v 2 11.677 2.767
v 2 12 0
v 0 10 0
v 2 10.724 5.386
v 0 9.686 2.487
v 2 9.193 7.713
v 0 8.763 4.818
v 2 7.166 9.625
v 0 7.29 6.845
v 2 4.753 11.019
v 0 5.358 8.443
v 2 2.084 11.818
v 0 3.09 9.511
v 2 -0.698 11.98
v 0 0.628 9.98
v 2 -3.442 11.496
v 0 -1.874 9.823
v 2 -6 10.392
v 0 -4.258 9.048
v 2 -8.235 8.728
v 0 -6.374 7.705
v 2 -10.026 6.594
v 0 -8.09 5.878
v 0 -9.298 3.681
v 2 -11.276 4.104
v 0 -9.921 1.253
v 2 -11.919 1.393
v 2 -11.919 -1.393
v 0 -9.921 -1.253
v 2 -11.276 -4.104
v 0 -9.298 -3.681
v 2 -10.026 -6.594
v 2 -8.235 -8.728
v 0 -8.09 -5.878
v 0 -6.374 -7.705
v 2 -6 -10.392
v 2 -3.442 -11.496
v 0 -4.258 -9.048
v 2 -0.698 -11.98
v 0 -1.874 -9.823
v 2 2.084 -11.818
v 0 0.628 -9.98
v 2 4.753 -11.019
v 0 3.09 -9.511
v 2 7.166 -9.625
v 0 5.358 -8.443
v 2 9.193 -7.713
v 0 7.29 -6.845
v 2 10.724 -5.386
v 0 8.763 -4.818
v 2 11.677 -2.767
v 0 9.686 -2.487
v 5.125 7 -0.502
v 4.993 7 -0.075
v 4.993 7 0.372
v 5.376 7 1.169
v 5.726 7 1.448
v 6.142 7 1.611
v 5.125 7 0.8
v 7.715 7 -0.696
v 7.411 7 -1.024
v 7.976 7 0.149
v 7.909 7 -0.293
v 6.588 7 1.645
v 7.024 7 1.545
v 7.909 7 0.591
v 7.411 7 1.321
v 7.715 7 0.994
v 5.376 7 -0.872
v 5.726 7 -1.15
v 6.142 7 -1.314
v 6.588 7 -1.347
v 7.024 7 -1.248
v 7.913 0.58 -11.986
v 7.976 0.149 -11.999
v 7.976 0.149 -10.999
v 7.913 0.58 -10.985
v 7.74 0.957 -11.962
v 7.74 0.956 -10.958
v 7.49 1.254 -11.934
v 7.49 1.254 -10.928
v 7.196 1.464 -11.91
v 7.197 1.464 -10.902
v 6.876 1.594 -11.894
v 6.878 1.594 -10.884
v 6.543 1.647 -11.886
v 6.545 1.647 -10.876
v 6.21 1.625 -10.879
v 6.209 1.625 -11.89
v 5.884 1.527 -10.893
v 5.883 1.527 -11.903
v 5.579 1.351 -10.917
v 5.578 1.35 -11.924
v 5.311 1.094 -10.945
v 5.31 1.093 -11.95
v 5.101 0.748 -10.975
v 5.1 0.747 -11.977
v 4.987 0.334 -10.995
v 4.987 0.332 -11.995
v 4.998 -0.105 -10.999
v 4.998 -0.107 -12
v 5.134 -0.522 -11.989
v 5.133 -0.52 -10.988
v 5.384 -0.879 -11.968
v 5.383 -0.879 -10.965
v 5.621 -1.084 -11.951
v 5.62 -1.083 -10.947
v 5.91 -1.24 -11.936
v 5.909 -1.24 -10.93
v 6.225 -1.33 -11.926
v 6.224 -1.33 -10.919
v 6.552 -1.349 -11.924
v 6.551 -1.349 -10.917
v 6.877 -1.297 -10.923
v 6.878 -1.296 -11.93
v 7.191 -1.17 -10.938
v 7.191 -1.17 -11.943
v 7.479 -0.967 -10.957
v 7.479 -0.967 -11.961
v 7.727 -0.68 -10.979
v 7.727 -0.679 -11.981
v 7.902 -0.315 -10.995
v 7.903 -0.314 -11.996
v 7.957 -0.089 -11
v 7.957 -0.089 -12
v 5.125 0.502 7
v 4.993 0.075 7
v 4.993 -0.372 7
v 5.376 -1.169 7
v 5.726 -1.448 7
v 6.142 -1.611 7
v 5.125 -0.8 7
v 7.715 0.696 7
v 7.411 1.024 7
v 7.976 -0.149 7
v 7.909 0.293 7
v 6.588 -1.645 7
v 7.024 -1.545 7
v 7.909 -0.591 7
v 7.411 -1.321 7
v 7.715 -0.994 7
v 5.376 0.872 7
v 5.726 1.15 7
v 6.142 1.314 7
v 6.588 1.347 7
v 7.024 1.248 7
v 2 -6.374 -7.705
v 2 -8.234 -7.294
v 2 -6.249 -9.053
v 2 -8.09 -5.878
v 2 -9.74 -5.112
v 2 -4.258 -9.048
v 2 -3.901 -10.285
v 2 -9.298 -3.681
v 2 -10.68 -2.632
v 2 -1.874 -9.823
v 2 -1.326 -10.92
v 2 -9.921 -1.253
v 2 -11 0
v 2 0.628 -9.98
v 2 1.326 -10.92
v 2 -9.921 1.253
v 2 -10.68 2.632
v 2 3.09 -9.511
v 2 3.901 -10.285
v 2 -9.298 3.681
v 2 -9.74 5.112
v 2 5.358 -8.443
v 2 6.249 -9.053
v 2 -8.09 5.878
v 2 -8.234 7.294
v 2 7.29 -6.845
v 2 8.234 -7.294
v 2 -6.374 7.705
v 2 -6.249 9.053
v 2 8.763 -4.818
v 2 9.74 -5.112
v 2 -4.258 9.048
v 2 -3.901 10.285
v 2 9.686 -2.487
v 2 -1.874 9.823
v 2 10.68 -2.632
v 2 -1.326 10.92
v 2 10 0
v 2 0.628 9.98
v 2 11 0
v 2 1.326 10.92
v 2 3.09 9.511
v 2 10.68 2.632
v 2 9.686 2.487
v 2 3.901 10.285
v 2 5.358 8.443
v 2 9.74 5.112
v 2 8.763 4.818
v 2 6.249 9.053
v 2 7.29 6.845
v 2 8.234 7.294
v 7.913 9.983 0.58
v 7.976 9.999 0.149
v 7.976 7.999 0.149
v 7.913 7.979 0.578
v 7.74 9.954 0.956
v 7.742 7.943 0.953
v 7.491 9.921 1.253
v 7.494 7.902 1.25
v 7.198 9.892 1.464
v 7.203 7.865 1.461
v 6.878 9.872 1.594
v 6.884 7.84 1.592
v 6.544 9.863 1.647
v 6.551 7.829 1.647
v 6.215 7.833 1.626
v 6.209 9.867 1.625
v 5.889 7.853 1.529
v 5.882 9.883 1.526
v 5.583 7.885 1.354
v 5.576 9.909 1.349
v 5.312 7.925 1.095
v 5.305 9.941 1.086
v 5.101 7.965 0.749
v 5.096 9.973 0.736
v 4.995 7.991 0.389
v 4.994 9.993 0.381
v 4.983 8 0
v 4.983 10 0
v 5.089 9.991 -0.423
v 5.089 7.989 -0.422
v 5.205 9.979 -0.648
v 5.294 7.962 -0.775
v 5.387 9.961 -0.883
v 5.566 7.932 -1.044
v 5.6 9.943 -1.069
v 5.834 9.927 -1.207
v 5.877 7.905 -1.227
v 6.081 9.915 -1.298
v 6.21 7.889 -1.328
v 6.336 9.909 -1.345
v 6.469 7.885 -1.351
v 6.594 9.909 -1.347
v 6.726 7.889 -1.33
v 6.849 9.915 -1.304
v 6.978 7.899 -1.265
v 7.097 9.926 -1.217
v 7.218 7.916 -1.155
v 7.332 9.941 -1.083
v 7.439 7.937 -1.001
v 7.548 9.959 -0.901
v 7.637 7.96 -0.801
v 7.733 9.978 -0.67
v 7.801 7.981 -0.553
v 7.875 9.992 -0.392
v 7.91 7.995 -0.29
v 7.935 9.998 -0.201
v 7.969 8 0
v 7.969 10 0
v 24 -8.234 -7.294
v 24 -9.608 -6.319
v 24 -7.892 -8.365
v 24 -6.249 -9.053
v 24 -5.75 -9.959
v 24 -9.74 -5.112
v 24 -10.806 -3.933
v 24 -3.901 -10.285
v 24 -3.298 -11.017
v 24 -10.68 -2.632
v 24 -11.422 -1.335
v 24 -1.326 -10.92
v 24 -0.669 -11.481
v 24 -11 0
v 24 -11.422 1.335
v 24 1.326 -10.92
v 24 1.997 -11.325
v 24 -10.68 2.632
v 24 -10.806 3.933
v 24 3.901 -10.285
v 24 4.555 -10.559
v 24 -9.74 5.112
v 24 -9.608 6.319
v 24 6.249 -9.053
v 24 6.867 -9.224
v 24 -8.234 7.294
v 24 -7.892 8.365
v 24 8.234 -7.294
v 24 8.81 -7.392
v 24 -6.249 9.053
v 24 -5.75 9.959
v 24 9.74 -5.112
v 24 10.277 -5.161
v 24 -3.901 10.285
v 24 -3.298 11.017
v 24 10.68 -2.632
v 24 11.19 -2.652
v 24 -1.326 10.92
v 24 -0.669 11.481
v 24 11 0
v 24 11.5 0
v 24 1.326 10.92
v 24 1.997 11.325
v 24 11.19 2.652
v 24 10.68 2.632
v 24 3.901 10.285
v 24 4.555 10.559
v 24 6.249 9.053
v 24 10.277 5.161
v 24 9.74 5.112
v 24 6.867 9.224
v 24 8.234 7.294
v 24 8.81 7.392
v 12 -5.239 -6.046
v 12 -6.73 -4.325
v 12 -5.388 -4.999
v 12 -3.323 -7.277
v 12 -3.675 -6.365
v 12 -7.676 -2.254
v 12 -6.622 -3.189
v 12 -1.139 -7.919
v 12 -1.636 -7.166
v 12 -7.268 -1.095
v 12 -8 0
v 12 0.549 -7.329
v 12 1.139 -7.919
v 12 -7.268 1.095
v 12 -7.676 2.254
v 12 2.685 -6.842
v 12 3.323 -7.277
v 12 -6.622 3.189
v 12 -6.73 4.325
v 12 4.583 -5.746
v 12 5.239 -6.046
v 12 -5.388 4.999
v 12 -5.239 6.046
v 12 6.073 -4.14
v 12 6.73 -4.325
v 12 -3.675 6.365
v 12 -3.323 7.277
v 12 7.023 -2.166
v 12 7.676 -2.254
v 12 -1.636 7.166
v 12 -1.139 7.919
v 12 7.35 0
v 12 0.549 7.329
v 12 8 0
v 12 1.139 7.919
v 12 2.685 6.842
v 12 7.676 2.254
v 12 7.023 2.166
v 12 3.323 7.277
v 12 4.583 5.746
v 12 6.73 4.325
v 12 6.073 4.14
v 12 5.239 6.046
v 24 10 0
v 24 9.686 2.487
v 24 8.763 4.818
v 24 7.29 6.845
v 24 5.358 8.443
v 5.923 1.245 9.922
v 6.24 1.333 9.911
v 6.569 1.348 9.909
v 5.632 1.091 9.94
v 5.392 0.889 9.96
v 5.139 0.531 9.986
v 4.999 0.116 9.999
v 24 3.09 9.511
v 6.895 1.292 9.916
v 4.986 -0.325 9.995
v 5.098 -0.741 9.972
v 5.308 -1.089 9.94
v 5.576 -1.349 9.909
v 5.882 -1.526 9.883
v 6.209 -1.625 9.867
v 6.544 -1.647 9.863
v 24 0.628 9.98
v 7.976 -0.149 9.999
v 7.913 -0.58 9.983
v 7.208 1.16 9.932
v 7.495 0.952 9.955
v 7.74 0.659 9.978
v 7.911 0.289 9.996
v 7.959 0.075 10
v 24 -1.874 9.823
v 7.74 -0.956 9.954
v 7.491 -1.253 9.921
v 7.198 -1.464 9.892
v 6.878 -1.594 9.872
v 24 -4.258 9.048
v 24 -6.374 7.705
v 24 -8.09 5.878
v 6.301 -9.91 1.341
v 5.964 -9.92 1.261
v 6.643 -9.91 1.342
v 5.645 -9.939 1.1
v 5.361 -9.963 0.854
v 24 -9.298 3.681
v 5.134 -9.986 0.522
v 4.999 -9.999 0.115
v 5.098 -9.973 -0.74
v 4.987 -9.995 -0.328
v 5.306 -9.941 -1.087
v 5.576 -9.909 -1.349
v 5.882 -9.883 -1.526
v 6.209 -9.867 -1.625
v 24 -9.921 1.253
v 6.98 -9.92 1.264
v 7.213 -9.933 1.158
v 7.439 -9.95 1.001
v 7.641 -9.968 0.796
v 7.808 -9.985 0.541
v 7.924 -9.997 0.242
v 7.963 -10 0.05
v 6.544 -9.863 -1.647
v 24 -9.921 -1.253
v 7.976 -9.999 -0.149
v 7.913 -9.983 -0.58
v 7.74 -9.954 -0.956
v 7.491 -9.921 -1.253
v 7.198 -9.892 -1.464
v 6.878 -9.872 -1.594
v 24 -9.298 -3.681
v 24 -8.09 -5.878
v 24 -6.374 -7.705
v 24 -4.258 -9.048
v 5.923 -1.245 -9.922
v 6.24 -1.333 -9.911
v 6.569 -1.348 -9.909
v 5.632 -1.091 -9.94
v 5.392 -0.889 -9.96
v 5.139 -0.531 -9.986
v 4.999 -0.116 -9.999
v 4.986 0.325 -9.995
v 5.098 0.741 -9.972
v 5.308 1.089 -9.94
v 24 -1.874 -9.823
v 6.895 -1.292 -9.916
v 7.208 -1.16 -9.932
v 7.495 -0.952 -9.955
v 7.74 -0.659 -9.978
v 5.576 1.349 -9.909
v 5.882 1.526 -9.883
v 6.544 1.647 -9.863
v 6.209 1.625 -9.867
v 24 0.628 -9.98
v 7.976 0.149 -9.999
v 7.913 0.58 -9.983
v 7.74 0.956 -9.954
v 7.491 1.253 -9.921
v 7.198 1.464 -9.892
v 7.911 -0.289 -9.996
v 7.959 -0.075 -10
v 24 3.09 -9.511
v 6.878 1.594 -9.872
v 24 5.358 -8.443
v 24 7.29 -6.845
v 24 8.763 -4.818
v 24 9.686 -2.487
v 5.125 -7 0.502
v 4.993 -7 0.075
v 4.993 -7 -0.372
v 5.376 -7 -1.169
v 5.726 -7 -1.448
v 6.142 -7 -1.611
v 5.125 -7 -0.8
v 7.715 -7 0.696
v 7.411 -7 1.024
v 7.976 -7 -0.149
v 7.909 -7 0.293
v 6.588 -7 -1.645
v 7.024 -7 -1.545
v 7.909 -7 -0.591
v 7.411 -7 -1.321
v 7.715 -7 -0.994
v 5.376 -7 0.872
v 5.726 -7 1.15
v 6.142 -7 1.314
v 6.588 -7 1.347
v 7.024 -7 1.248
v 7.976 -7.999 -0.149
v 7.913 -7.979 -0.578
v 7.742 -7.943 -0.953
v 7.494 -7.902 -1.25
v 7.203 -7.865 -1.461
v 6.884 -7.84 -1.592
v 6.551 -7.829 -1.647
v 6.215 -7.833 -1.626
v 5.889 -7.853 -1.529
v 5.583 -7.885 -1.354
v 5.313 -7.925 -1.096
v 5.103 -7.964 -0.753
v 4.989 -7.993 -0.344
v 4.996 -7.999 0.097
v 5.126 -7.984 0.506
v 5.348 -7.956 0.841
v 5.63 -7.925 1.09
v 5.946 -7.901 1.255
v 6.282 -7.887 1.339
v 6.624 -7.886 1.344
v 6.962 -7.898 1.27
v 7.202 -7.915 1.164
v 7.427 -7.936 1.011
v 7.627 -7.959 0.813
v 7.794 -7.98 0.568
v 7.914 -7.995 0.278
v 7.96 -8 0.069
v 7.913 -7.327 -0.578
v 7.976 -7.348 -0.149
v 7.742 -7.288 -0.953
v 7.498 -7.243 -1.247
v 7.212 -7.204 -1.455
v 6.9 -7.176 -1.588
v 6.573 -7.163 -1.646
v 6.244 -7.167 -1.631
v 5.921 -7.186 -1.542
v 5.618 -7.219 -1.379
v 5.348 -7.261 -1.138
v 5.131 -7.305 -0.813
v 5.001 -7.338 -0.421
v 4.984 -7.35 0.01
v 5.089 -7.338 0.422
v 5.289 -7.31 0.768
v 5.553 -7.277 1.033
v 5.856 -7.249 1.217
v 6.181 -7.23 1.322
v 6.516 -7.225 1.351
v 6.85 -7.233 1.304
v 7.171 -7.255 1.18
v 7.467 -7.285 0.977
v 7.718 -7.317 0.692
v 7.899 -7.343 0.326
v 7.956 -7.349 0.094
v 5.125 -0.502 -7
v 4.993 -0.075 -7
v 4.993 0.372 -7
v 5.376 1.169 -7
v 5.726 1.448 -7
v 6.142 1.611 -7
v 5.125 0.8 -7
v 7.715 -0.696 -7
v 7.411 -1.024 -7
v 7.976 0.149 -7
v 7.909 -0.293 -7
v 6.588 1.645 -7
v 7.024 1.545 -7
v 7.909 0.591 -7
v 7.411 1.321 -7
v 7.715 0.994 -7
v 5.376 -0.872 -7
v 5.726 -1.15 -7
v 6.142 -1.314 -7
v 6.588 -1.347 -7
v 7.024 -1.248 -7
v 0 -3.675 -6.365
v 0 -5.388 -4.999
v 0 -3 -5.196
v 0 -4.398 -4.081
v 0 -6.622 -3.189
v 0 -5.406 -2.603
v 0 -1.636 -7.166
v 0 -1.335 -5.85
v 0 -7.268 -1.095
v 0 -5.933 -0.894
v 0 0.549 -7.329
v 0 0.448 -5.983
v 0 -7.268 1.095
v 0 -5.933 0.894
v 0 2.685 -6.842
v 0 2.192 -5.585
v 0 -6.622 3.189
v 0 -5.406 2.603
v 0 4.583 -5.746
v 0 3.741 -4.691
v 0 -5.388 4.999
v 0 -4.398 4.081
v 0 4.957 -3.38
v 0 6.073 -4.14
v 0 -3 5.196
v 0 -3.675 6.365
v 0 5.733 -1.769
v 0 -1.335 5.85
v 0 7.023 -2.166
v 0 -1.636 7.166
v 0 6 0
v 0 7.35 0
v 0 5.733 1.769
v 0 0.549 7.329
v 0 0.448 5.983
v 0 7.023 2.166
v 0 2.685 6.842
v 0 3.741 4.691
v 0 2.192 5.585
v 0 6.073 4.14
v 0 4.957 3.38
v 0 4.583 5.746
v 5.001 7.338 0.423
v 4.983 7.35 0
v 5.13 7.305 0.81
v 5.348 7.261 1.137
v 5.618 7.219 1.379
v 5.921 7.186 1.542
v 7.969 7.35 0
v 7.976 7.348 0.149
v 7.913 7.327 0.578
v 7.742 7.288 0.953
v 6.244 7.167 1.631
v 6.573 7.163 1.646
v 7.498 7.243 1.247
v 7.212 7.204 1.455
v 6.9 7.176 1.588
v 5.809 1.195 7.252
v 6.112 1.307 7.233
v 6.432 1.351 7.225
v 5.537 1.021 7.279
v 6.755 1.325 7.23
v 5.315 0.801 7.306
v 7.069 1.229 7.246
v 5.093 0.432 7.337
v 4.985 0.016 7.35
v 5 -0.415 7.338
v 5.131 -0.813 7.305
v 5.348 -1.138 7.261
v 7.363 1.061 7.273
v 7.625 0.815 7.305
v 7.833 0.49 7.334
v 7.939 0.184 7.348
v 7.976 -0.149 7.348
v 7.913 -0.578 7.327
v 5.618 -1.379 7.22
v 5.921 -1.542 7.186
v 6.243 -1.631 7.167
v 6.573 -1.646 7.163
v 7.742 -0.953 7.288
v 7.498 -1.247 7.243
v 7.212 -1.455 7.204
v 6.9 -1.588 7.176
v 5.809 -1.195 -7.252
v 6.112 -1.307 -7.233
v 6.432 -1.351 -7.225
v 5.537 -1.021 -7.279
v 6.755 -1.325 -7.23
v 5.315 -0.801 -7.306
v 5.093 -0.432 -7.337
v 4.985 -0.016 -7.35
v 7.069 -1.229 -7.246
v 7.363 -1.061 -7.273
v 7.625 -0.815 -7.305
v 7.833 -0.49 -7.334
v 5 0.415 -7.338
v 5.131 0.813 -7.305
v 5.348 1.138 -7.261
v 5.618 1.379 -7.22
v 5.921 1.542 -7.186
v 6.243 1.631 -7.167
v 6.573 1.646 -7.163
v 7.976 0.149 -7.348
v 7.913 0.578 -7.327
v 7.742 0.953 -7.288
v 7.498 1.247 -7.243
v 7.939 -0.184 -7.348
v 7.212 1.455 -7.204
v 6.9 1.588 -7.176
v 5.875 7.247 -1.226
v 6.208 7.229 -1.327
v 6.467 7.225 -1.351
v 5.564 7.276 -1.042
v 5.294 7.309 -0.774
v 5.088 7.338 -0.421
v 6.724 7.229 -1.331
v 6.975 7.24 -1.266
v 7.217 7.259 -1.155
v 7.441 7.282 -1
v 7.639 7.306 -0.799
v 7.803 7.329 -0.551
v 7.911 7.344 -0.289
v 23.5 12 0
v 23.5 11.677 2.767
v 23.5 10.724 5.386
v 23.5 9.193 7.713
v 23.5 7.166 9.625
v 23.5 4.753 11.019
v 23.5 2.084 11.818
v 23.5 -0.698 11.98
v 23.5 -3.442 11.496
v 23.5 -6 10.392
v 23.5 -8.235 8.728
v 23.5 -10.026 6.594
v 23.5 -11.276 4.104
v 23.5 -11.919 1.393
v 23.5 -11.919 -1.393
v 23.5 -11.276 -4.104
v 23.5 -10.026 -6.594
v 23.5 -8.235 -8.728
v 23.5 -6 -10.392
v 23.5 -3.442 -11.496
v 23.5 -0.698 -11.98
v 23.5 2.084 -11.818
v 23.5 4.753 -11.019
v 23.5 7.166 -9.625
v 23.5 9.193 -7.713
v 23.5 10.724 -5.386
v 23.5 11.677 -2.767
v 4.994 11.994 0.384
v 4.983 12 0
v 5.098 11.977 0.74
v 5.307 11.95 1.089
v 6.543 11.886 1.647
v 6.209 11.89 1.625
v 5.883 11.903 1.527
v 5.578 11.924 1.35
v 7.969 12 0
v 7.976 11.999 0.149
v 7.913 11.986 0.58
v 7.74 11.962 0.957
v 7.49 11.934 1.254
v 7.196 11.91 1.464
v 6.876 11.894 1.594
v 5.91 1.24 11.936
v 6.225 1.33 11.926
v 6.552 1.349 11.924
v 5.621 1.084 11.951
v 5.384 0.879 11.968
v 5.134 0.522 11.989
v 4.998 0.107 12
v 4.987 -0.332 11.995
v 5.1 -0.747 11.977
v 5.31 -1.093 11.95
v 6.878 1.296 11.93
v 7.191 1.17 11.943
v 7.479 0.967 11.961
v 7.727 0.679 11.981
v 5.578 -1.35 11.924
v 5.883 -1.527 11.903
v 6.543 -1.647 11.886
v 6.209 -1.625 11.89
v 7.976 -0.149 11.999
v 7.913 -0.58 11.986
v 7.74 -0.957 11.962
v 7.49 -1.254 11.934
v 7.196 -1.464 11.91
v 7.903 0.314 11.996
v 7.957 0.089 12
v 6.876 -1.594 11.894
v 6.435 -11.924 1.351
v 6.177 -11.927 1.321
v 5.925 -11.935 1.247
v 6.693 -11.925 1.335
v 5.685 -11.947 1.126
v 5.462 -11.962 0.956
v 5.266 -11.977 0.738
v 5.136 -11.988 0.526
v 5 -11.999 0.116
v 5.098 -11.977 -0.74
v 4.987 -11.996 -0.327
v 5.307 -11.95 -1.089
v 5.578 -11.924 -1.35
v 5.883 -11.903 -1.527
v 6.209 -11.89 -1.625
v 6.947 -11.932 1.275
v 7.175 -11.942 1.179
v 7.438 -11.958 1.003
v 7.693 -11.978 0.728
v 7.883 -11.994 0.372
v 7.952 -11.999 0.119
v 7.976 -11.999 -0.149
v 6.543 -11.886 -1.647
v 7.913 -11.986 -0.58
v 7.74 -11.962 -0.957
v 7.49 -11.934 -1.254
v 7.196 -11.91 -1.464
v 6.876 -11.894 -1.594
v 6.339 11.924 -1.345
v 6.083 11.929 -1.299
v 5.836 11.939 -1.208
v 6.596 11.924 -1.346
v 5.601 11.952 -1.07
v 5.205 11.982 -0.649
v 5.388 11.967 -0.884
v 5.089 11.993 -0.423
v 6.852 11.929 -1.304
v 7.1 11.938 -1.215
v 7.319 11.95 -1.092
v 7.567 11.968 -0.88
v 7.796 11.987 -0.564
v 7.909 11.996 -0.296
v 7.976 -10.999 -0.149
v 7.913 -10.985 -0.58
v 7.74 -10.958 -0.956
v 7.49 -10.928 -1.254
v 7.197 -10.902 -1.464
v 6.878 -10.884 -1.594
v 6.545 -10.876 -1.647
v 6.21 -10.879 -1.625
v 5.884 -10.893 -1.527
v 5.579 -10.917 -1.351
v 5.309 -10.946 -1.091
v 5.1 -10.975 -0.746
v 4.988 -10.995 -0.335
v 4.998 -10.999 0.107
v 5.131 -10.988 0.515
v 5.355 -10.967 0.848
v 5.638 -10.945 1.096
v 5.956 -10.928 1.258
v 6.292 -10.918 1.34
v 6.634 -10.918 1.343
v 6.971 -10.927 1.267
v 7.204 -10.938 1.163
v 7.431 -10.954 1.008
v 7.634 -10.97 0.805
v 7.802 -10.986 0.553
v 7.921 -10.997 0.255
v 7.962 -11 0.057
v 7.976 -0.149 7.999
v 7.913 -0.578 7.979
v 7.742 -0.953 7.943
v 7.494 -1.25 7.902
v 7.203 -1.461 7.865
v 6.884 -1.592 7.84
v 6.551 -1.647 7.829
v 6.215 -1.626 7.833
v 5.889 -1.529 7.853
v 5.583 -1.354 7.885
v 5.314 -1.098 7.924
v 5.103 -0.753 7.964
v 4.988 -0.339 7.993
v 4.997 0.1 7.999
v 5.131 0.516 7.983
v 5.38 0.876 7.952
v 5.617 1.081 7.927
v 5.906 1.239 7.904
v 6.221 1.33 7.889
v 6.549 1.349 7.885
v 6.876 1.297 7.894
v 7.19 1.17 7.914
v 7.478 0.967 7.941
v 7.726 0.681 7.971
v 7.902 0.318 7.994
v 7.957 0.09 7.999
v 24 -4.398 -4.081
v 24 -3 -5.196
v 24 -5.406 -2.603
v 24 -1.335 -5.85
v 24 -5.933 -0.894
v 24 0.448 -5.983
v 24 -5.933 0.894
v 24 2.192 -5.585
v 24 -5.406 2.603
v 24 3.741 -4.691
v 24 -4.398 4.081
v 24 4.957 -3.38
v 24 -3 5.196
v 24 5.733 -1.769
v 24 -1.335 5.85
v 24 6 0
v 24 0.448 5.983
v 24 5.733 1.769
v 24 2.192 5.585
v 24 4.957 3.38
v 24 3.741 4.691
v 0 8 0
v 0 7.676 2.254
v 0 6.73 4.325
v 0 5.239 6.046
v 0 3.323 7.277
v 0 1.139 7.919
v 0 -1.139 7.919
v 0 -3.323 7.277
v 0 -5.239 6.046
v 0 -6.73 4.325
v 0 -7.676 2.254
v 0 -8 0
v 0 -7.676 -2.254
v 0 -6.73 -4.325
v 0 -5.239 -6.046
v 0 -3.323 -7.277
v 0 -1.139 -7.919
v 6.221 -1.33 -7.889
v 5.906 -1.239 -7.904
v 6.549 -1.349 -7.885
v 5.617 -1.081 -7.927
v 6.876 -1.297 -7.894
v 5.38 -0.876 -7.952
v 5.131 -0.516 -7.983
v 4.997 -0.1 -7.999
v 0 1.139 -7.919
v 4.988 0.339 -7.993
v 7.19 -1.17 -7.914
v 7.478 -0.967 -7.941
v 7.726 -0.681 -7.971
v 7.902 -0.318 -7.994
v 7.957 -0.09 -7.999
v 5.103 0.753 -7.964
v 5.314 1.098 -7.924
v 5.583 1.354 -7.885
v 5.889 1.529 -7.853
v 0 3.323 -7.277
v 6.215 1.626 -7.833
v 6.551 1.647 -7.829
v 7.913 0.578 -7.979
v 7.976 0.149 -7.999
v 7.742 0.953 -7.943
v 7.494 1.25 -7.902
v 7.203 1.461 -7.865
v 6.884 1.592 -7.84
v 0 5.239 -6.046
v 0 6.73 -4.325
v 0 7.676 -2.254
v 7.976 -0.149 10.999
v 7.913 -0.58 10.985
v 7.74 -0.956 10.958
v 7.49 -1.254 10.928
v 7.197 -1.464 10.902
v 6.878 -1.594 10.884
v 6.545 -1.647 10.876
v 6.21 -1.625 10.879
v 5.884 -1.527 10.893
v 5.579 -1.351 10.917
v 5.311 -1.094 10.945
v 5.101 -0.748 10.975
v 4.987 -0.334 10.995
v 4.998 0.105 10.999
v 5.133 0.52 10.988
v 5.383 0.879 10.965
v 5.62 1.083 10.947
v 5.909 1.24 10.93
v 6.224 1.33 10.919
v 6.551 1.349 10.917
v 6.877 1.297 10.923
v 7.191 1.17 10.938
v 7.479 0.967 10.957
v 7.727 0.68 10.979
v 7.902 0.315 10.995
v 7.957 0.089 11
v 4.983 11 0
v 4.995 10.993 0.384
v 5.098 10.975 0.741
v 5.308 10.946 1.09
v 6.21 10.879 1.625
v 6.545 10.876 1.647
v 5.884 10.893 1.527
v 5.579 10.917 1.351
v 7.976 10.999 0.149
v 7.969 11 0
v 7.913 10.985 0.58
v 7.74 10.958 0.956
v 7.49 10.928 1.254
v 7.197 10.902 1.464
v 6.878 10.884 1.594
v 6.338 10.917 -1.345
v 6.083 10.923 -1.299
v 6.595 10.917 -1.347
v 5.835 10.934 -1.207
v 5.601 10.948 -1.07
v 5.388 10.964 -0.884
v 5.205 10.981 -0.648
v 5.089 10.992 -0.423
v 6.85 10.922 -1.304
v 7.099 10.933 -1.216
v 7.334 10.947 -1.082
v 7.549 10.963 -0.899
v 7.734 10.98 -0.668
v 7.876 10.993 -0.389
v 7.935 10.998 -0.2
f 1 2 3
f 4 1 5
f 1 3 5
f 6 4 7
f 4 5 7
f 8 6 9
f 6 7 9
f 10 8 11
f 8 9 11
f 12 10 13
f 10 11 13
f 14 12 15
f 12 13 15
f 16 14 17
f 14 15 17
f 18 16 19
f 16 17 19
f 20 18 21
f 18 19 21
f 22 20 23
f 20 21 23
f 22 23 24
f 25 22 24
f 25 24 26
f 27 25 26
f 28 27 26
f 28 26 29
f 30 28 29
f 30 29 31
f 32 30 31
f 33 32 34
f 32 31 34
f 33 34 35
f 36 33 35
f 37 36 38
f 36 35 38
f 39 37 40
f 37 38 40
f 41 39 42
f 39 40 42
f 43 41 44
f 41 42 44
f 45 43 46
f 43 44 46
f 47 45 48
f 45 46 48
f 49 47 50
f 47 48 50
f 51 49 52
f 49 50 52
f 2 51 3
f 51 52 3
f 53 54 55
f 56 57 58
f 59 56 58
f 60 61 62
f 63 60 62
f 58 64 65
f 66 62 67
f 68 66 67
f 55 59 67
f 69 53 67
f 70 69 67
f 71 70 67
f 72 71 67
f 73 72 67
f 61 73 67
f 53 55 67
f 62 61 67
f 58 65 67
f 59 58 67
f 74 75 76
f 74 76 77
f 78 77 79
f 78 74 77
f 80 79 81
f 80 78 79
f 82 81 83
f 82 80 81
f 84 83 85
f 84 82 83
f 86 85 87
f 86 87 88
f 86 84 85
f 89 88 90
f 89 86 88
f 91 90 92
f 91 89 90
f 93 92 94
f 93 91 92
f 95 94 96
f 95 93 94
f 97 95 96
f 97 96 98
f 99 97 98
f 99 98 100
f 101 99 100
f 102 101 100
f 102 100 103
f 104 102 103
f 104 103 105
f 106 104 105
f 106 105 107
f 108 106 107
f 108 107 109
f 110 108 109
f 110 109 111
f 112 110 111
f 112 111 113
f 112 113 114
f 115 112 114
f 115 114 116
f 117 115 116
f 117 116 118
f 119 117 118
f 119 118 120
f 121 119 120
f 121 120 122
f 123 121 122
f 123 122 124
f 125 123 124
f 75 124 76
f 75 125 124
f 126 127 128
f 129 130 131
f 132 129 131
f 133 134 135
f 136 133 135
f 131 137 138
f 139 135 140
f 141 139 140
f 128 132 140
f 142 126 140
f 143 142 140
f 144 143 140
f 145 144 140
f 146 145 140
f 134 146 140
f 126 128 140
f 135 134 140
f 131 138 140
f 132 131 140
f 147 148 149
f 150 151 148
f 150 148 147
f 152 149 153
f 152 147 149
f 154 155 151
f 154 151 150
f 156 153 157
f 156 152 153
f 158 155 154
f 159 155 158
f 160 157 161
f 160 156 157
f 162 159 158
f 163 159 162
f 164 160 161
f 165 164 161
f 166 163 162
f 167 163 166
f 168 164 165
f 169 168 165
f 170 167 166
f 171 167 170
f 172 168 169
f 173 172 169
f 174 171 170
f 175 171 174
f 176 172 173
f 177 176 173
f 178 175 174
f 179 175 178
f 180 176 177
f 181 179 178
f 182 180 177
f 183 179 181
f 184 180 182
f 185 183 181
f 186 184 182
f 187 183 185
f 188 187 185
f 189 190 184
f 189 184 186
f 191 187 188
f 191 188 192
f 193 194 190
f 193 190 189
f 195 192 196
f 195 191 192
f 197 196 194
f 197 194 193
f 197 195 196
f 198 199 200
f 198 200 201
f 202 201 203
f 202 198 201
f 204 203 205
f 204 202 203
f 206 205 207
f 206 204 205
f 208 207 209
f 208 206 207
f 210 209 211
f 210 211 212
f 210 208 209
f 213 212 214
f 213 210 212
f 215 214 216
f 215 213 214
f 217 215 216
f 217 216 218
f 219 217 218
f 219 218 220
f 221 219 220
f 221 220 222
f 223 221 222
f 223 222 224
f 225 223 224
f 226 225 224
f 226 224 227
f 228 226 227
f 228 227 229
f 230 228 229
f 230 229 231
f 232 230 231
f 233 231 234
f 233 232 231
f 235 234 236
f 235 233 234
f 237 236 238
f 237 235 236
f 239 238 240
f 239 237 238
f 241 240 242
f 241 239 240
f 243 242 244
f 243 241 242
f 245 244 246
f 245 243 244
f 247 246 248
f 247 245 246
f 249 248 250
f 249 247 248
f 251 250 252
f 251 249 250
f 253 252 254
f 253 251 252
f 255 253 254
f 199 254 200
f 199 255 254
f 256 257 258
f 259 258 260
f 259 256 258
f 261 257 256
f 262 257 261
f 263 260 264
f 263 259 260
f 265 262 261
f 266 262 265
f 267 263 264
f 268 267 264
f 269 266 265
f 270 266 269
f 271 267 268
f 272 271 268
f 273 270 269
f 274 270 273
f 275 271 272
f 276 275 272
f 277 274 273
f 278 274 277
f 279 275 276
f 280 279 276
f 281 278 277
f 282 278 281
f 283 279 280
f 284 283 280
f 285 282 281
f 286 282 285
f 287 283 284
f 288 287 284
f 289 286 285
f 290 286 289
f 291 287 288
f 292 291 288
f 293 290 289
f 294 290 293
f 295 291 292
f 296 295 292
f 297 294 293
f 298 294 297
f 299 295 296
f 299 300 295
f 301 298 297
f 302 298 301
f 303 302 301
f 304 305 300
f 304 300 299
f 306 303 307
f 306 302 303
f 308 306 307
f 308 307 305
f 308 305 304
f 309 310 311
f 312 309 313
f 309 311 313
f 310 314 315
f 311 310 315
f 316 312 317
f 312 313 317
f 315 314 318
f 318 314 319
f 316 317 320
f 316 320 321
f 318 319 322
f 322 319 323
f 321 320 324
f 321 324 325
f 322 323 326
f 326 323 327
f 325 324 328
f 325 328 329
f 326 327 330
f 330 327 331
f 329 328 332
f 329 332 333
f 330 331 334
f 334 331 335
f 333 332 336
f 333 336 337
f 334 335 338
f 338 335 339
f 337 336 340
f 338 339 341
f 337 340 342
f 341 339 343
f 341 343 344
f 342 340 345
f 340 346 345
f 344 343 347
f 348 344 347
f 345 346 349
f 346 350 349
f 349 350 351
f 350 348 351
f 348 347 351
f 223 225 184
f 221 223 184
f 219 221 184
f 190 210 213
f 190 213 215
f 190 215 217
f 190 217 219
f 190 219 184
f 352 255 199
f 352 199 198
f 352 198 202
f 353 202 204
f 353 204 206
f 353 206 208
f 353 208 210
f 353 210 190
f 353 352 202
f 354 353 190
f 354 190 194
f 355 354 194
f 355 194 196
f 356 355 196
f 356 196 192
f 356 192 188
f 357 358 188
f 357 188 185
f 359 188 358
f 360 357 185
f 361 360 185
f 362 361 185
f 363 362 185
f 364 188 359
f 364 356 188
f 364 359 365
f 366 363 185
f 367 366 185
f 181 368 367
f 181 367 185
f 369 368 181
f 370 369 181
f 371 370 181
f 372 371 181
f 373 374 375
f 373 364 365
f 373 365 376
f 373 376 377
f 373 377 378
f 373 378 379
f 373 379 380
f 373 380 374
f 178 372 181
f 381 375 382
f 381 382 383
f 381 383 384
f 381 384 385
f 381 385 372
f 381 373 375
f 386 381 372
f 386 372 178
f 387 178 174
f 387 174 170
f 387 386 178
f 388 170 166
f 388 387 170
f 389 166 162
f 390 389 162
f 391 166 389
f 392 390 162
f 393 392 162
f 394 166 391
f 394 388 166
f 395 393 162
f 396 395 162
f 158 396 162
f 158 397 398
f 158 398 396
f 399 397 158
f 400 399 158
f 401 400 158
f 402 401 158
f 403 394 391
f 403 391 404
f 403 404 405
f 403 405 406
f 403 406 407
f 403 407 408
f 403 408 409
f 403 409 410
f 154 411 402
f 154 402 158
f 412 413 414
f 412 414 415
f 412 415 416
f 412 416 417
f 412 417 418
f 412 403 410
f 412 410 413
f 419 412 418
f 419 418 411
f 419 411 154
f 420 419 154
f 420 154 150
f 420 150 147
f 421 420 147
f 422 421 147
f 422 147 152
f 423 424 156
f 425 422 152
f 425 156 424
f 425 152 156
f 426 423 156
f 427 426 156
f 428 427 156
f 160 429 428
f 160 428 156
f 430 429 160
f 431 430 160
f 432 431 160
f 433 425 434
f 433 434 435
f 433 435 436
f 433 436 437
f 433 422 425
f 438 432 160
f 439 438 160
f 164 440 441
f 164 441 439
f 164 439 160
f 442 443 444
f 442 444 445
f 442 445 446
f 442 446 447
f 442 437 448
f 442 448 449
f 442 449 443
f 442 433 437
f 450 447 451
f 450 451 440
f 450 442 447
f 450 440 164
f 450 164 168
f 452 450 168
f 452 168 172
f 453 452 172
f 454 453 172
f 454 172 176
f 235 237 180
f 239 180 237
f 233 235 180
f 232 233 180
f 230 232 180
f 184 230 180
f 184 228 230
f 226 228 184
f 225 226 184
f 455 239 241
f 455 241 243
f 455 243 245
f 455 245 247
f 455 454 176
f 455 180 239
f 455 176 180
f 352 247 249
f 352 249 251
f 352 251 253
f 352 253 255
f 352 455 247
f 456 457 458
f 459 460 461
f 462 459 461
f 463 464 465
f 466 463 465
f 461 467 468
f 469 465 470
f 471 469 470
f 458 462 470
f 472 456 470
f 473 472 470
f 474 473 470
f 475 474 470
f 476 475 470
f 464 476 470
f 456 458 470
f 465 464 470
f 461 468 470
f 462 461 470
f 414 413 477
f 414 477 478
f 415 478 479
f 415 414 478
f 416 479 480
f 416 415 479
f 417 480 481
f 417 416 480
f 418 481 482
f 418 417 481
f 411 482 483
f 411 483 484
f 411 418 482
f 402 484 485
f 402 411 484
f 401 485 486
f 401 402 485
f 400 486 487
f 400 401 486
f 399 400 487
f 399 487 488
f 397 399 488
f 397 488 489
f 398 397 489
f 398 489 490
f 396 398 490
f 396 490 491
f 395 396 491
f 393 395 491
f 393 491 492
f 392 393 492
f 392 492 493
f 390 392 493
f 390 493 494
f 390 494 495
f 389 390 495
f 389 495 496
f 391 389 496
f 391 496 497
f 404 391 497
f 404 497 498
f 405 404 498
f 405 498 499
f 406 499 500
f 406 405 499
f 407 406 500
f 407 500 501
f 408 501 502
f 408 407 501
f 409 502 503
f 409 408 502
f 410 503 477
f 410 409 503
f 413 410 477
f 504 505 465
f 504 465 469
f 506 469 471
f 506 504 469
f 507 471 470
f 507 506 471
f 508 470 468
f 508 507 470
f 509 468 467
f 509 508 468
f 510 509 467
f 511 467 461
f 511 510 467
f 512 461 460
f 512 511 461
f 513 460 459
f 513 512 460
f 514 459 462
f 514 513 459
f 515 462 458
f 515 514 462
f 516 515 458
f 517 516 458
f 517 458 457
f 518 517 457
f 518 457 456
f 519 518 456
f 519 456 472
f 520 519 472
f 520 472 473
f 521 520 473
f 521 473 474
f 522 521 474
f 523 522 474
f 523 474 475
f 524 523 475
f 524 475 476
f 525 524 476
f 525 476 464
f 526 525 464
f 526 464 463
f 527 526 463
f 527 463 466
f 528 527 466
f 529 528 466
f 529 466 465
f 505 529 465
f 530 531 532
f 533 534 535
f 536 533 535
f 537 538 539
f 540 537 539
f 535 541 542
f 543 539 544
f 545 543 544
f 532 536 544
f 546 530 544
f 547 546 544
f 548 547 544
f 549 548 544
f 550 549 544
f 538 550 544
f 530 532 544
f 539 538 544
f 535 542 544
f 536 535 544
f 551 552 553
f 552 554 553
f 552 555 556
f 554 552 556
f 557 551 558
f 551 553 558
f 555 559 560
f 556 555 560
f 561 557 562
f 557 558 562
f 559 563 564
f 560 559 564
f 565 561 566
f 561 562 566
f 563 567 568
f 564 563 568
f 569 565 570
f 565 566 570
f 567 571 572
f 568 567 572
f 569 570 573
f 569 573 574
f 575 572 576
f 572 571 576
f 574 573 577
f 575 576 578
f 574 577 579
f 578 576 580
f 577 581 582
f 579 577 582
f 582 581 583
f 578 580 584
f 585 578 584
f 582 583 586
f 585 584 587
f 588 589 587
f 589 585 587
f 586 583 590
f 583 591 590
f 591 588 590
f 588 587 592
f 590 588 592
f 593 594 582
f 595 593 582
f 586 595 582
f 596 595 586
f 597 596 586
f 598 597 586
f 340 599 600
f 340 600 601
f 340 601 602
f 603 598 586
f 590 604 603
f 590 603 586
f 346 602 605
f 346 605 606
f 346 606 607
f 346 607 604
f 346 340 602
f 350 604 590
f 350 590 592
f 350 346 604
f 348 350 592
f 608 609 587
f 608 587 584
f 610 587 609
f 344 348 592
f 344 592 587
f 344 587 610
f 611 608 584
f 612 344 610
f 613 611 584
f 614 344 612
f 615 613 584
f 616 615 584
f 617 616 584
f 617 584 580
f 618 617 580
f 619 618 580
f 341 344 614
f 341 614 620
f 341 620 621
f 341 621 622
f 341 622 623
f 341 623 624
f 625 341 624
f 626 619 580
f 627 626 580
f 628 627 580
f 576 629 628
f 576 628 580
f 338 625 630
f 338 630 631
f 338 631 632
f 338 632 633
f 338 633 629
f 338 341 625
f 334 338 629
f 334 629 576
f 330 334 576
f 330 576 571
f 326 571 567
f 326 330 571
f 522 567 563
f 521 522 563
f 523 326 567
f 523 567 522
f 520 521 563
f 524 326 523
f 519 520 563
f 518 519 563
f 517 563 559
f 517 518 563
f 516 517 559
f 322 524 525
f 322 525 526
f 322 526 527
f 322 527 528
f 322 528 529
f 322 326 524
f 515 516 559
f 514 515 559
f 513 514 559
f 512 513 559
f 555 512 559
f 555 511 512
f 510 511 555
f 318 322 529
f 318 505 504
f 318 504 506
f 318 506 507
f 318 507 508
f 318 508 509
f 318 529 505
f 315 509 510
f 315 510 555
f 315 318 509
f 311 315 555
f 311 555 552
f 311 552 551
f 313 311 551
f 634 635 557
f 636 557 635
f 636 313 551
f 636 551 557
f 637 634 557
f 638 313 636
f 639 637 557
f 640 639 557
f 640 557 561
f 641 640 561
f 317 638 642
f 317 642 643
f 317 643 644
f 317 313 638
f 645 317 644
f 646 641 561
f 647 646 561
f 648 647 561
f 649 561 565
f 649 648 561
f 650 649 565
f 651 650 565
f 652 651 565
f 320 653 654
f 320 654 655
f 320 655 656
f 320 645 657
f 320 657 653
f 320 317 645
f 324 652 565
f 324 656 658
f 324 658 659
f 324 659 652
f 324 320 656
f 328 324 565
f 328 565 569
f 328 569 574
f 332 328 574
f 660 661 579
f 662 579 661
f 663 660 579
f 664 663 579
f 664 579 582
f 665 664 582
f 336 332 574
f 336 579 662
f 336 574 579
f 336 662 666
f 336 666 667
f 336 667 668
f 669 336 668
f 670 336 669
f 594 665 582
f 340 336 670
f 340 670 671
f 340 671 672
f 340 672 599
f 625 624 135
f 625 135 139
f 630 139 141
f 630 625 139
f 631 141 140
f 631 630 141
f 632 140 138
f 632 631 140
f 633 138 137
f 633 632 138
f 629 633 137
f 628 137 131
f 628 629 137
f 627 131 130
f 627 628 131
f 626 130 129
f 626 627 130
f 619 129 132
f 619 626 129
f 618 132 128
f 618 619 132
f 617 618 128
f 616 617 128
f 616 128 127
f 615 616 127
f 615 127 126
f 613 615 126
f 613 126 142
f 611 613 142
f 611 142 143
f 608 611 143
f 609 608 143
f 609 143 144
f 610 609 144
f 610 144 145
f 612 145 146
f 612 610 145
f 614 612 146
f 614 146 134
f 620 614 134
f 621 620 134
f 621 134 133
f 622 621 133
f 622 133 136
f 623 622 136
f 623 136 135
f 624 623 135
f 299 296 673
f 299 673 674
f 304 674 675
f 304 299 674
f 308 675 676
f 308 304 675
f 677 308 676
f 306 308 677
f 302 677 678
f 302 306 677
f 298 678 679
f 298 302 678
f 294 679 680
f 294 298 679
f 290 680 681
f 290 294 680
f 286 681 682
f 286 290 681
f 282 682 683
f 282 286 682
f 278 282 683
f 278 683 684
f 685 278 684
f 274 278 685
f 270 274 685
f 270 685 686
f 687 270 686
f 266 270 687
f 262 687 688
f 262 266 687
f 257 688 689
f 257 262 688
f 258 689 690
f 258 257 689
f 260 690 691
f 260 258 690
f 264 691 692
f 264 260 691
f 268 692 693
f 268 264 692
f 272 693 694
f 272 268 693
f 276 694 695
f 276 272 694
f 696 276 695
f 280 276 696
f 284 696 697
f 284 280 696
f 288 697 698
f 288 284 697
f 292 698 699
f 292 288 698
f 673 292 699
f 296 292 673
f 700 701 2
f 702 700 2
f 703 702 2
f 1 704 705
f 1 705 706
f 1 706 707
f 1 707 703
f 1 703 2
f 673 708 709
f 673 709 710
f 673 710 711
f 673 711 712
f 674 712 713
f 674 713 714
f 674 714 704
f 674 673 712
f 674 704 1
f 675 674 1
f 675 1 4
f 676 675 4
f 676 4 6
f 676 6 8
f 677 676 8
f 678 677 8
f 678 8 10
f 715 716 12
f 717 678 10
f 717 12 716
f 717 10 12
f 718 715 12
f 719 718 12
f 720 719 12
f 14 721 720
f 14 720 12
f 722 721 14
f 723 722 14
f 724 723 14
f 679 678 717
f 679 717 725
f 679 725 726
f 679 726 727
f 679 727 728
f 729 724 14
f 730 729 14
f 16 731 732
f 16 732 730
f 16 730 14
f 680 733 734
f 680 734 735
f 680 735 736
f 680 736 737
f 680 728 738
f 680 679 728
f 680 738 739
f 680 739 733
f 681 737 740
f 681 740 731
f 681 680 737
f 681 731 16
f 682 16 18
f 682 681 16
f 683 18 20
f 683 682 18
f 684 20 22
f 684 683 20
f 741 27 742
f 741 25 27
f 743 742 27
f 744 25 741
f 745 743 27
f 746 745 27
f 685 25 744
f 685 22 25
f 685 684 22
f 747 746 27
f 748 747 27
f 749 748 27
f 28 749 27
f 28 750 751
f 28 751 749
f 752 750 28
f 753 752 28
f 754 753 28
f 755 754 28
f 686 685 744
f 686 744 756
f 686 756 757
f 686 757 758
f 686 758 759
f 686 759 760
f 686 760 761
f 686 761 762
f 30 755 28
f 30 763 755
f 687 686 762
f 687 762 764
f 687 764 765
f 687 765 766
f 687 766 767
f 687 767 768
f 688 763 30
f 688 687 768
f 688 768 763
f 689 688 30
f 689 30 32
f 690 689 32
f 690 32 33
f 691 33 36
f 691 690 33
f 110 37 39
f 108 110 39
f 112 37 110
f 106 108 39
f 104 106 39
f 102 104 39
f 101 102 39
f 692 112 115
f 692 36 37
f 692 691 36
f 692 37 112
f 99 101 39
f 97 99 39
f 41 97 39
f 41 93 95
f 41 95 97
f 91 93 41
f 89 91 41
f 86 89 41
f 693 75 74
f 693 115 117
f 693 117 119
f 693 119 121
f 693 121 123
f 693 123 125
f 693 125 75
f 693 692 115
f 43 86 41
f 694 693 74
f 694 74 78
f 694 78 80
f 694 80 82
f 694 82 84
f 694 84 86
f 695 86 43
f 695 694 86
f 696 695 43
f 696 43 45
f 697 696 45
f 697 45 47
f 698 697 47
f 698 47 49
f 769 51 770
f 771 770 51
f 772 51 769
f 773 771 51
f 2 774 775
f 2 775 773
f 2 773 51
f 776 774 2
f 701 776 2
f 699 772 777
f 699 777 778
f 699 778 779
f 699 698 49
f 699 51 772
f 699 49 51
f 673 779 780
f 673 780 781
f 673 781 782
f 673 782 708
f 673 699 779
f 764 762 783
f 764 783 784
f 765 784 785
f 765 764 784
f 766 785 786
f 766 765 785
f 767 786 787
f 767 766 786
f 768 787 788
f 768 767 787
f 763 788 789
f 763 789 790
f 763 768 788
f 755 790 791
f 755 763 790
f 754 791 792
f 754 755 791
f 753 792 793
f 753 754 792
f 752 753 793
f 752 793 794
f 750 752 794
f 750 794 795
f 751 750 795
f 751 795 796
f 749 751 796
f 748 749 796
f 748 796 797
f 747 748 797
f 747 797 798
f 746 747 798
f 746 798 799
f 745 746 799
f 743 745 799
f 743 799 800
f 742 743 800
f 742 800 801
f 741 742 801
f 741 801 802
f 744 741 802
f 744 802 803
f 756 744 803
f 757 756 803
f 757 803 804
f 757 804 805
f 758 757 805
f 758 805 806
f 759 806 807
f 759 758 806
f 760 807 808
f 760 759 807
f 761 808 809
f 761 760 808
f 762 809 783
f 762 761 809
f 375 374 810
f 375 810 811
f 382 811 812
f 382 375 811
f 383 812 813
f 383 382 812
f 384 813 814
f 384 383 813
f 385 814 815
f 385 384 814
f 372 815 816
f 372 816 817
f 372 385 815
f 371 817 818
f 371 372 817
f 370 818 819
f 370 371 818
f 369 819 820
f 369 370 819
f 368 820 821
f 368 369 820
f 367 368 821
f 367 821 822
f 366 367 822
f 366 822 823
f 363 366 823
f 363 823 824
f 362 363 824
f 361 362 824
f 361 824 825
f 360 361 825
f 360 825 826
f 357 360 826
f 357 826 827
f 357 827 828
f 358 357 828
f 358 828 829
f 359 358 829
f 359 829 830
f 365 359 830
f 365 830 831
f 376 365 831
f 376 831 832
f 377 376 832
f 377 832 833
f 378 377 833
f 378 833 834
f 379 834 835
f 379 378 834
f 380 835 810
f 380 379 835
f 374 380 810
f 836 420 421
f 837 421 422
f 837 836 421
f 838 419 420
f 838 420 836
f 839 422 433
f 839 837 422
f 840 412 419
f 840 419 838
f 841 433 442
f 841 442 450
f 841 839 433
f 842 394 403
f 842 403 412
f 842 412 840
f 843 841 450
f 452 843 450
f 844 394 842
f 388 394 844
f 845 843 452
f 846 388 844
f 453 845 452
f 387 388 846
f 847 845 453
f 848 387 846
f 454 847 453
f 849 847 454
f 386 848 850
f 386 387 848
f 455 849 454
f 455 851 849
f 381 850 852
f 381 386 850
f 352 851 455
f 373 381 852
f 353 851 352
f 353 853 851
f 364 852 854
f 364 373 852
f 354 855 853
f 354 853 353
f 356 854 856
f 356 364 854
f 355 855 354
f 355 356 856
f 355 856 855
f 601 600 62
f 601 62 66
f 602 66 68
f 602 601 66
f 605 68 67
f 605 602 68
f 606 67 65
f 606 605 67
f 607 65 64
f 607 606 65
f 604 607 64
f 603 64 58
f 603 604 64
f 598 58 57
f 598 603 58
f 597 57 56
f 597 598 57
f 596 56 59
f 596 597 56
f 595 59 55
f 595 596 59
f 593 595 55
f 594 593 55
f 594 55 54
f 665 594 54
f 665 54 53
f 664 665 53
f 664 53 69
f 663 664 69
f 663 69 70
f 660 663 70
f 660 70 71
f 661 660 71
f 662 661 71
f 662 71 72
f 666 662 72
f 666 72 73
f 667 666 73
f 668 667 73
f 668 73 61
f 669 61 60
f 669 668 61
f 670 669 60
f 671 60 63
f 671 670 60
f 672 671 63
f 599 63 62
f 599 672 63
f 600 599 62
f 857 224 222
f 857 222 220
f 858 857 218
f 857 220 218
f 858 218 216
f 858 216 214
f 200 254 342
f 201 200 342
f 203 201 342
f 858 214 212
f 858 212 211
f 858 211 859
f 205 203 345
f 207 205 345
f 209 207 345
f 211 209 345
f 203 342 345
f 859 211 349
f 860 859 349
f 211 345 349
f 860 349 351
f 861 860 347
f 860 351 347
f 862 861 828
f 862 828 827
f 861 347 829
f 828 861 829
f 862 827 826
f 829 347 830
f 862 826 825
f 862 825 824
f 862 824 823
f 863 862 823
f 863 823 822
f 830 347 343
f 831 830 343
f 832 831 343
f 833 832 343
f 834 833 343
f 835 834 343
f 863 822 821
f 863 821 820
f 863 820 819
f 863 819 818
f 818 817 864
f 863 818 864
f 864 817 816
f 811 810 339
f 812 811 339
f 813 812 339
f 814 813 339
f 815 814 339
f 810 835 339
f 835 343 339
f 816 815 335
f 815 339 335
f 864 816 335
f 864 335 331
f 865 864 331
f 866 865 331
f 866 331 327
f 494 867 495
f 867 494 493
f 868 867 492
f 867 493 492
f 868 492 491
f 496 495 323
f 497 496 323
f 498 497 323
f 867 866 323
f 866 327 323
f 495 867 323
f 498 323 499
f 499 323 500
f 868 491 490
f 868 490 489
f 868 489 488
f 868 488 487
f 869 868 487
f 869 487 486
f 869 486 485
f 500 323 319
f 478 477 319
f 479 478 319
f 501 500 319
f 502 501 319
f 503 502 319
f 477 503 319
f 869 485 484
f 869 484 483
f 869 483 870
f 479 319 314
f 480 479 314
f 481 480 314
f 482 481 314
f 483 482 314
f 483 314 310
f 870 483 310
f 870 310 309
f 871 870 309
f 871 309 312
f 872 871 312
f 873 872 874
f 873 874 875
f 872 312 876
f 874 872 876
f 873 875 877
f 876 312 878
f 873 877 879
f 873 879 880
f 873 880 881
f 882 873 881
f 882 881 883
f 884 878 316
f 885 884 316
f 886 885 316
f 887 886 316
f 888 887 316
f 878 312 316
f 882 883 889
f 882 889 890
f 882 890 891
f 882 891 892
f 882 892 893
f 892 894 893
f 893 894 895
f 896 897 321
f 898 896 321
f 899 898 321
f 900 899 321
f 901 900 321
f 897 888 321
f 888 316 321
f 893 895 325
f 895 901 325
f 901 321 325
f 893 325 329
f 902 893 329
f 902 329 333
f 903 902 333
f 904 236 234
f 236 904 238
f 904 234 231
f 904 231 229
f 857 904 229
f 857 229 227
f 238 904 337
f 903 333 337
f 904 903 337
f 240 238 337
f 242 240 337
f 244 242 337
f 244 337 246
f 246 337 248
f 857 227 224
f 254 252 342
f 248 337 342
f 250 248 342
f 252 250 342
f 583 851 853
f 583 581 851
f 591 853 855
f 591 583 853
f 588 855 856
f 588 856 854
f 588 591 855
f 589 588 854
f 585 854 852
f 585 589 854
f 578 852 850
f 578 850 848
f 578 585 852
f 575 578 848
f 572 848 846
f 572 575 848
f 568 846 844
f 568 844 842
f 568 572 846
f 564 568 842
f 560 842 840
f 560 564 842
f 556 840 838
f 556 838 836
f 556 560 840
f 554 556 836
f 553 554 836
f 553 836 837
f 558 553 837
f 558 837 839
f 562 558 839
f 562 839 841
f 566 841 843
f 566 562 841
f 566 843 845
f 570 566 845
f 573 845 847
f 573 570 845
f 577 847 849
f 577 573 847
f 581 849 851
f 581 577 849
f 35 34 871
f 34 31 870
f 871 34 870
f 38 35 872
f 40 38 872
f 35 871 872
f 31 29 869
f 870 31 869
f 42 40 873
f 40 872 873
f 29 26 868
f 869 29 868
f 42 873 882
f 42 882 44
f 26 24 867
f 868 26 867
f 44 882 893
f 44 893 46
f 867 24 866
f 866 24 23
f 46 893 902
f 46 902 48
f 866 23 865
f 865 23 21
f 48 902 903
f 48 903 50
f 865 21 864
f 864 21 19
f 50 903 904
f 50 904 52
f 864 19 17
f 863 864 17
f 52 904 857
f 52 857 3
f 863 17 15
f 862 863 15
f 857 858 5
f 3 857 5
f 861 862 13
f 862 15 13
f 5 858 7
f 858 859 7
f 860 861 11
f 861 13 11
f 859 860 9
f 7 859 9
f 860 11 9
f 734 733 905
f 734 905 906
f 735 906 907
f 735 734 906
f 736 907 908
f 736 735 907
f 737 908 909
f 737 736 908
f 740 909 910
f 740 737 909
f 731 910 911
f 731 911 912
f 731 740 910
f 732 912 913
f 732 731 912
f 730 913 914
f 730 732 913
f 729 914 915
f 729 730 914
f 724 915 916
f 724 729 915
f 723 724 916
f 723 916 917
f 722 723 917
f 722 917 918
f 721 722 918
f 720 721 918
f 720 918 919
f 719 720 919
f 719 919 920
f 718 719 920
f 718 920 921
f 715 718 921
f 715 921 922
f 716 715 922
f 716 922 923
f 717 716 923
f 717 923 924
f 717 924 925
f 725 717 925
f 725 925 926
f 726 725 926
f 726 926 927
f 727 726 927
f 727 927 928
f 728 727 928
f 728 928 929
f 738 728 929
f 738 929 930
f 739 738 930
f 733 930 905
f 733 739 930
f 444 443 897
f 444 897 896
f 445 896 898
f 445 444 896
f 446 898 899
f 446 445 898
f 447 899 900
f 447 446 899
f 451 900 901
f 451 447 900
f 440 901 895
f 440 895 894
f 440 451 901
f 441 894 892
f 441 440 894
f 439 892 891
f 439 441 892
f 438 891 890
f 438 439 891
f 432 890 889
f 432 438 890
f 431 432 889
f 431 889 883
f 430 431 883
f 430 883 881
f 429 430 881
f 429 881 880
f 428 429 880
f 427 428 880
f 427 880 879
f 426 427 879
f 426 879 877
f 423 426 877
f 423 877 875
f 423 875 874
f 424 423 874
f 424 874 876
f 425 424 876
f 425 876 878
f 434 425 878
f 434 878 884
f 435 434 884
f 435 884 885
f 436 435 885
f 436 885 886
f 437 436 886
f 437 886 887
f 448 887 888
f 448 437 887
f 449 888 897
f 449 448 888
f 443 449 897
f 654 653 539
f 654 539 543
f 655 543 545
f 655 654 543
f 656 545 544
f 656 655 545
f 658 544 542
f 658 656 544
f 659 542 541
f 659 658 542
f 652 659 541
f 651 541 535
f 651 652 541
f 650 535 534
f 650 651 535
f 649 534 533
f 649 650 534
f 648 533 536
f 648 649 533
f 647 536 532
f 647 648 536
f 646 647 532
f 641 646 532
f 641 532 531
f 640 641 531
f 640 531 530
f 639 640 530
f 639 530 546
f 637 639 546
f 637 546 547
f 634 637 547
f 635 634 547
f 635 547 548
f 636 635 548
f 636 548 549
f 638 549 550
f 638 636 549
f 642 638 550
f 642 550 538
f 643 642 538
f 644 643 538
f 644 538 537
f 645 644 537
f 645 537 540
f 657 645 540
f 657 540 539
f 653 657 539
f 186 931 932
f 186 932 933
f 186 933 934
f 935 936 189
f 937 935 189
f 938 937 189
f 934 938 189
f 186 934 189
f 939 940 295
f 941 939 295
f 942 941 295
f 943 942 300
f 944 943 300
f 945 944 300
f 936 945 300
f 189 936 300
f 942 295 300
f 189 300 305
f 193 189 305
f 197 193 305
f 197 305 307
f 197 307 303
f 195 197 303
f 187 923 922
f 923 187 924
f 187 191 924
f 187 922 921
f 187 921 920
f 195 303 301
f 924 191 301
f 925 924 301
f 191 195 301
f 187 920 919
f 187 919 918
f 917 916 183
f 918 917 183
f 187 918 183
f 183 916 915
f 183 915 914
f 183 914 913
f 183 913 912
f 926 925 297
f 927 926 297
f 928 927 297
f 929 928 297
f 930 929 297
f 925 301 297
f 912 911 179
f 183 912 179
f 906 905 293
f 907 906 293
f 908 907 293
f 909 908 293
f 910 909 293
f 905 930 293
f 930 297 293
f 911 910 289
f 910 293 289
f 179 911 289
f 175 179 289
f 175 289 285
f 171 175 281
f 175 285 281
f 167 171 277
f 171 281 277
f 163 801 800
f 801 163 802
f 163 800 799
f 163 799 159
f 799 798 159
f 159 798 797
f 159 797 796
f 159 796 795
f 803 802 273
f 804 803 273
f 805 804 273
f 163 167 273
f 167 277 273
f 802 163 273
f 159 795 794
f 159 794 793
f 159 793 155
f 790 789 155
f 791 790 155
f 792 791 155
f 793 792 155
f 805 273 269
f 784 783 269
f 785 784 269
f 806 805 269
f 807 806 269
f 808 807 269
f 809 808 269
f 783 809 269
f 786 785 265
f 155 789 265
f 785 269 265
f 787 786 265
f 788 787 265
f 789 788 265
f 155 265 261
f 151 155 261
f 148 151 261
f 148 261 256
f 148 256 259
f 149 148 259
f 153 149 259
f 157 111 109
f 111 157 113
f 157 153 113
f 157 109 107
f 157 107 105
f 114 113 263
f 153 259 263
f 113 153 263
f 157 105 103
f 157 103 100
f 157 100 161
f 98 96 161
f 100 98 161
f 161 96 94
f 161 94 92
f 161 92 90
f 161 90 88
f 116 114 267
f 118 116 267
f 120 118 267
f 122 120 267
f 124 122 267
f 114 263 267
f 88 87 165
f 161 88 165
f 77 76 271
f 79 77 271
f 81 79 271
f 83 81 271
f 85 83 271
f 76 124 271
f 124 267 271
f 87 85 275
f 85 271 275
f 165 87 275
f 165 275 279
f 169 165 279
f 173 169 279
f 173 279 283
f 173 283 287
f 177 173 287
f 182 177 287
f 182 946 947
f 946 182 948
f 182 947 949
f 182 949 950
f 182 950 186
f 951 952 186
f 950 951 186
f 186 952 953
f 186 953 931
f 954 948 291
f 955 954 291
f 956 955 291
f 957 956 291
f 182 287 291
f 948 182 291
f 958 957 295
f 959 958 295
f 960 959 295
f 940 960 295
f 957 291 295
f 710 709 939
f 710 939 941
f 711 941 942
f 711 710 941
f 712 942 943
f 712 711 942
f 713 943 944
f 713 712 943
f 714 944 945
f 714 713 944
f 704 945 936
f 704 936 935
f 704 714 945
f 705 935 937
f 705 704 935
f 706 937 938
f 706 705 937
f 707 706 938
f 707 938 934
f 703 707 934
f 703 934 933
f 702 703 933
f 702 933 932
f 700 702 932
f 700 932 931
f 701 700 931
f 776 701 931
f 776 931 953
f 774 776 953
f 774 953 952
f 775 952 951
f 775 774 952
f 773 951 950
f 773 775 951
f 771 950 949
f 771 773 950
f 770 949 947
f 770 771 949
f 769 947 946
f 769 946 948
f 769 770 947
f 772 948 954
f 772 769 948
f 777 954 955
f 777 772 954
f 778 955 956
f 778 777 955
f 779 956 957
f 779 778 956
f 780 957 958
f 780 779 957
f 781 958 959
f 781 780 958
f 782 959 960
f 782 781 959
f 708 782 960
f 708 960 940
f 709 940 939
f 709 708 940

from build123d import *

# Parameters (mm, degrees)
SKETCH017_R           = 12
SKETCH017_R_2         = 6
PAD007_DEPTH          = 12
SKETCH018_R           = 11
SKETCH018_R_2         = 10
POCKET010_DEPTH       = 22
SKETCH019_R           = 8
SKETCH019_R_2         = 7.35
POCKET011_DEPTH       = 13
CHAMFER_SIZE          = 2
CHAMFER001_SIZE       = 0.5
SKETCH020_R           = 1.5
POCKET012_DEPTH       = 5
POLARPATTERN003_COUNT = 4


with BuildPart() as part:
    # Sketch017 → Pad007 (new body, symmetric)
    with BuildSketch(Plane.YZ):
        Circle(SKETCH017_R)
        Circle(SKETCH017_R_2, mode=Mode.SUBTRACT)
    extrude(amount=PAD007_DEPTH, both=True)

    # Sketch018 (on Face4 of Pad007) → Pocket010 (cut)
    with BuildSketch(Plane.YZ.offset(12)):
        Circle(SKETCH018_R)
        Circle(SKETCH018_R_2, mode=Mode.SUBTRACT)
    extrude(amount=-POCKET010_DEPTH, mode=Mode.SUBTRACT)

    # Sketch019 → Pocket011 (cut)
    with BuildSketch(Plane.YZ):
        Circle(SKETCH019_R)
        Circle(SKETCH019_R_2, mode=Mode.SUBTRACT)
    extrude(amount=-POCKET011_DEPTH, mode=Mode.SUBTRACT)

    # Chamfer
    chamfer_edges = [part.edges().sort_by_distance(p)[0] for p in [
        (-12, -12, 0),
    ]]
    chamfer(chamfer_edges, length=CHAMFER_SIZE)

    # Chamfer001
    chamfer001_edges = [part.edges().sort_by_distance(p)[0] for p in [
        (12, -12, 0),
    ]]
    chamfer(chamfer001_edges, length=CHAMFER001_SIZE)

    # Sketch020 → Pocket012 (cut)
    with BuildSketch(Plane.XY.offset(-12)):
        with Locations((-5.524041, 0.1487)):
            Circle(SKETCH020_R)
    pocket012 = extrude(amount=POCKET012_DEPTH, mode=Mode.SUBTRACT)

    # PolarPattern003: Pocket012 ×4 about axis
    polarpattern003_axis = Axis((0, 0, 0), (1, 0, 0))
    for i in range(1, POLARPATTERN003_COUNT):
        add(pocket012.rotate(polarpattern003_axis, i * 360 / POLARPATTERN003_COUNT), mode=Mode.SUBTRACT)


with BuildPart() as part_1:
    # Body003 placement: moved
    add(part.part.moved(Location((12, 0, 0))))


solid = part_1.part
